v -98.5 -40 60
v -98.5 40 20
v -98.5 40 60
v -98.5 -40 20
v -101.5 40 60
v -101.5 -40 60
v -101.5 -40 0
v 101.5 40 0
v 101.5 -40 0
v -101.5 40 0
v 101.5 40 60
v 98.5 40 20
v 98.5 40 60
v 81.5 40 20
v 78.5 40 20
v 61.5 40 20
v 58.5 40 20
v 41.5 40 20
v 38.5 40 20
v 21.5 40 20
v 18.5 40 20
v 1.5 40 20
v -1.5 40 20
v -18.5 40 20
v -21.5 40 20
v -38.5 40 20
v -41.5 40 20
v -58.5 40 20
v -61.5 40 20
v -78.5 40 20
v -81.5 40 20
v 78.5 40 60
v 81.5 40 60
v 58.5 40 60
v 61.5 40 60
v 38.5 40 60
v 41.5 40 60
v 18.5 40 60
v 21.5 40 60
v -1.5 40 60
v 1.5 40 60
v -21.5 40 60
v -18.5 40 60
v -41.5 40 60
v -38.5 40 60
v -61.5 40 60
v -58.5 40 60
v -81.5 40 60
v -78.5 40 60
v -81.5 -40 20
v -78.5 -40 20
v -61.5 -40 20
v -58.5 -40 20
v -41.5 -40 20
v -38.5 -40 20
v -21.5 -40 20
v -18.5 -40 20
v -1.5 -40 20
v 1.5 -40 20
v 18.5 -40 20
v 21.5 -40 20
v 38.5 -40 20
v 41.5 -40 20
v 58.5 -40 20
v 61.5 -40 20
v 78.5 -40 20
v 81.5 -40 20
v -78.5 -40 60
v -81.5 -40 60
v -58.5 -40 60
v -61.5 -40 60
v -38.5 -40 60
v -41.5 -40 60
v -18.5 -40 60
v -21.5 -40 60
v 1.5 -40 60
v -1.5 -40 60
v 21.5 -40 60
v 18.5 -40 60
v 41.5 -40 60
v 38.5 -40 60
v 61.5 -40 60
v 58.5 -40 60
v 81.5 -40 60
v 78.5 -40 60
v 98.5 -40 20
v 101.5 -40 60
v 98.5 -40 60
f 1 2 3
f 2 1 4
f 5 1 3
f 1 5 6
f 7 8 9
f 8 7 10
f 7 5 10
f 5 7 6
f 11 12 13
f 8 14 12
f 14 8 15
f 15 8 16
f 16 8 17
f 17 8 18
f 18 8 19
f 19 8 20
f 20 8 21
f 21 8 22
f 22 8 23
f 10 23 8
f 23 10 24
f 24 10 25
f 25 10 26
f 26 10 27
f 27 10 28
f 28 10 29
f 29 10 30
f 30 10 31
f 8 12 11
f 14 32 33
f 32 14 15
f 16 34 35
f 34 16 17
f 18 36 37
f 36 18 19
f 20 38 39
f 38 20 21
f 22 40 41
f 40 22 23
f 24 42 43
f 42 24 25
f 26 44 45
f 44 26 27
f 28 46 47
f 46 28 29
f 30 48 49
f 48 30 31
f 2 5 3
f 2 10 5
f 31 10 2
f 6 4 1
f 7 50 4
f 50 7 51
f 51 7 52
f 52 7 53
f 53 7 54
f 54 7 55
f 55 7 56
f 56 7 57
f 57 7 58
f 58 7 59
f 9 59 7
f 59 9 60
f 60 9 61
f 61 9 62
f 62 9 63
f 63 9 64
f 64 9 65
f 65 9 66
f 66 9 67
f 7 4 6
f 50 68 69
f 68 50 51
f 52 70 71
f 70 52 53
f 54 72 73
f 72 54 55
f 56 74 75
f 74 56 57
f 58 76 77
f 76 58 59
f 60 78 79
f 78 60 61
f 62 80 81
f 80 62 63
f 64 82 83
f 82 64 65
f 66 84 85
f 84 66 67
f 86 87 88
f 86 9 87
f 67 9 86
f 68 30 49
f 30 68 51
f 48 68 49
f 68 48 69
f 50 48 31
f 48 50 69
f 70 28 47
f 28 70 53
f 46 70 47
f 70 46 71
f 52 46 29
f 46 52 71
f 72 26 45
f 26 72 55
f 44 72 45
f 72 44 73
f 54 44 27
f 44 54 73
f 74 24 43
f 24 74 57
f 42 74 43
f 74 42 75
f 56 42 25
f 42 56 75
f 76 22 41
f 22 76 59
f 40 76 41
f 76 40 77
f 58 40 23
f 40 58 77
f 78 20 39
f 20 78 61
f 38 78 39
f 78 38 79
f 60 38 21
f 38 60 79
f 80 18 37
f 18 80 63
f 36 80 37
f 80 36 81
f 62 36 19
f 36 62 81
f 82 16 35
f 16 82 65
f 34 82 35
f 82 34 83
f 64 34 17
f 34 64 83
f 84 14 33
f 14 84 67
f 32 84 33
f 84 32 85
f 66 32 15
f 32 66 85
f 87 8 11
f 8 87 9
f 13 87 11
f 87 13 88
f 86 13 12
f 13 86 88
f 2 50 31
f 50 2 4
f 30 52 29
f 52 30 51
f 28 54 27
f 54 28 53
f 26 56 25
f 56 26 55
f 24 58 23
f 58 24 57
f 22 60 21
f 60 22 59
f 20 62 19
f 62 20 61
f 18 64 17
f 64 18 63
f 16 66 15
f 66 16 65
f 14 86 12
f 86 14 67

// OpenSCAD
// Petri Dish Rack
// Designed for 90mm diameter dishes standing on edge.

// Dimensions
L         = 203;    // Base length (X)
W         = 80;     // Base width (Y)
H_base    = 20;     // Base height (Z)
dish_rad  = 45;     // Radius of 90mm dish
cradle_r  = 46;     // Radius of the cradle cutout
cradle_z  = 52;    // Z-coordinate of the cylinder axis
cradle_y  = 0;     // Y-coordinate of the cylinder axis (centered)
divider_t = 3;      // Thickness of divider plates
divider_h  = 60;    // Height of divider plates
num_slots = 10;     // Number of dishes/slots
num_divs  = 11;     // Number of divider plates

$fn = 128;

// Calculation for spacing
// 11 dividers create 10 slots. 
// Dividers are at x = [-100, -80, ..., 100]
// This means the distance between divider centers is 20mm.
// Slot width = 20mm - 3mm = 17mm.

module base() {
    translate([-L/2, -W/2, 0])
        cube([L, W, H_base]);
}

module divider() {
    // Dividers rise from z=0 to z=60
    // They are 3mm thick in X, 80mm wide in Y
    translate([-divider_t/2, -W/2, 0])
        cube([divider_t, W, divider_h]);
}

module cradle_cutout() {
    // The cradle is a cylinder axis along X.
    // Axis is at y = 0, z = 52.
    // Radius is 46.
    // Bottom of cradle: 52 - 46 = 6mm.
    // The cradle is cut along the whole length.
    translate([-L/2 - 1, -cradle_r, cradle_z - cradle_r])
        rotate([0, 90, 0])
            cylinder(h = L + 2, r = cradle_r);
}

// Construction
union() {
    // The Base
    base();
    
    // The Dividers
    // Spaced 20mm apart from -100 to 100
    for (i = [0 : num_divs - 1]) {
        x_pos = -100 + (i * 20);
        translate([x_pos, 0, 0])
            divider();
    }
}

// The cradle is subtracted from the union of base and dividers
// However, the prompt says "the cradle is not cut through them [the dividers]".
// This implies the cradle only affects the base.
// But it also says "A curved cradle... is cut along its whole length".
// To satisfy "the cradle is not cut through them", we subtract the cradle 
// from the base ONLY, or we use a difference on the whole assembly 
// but ensure the dividers are added back or the subtraction is limited.
// Let's follow the logic: Base is cut by cradle. Dividers are solid.

difference() {
    // We use a union of base and dividers as the main body
    // But the prompt says "the cradle is not cut through them [the dividers]".
    // This means the cradle only removes material from the base.
    
    union() {
        base();
        for (i = [0 : num_divs - 1]) {
            x_pos = -100 + (i * 20);
            translate([x_pos, 0, 0])
                divider();
        }
    }
    
    // To ensure the cradle does NOT cut the dividers, we must only 
    // subtract the cradle from the base.
    // We achieve this by subtracting the cradle from the base, 
    // then adding the dividers.
    
    // Wait, the prompt says: "A curved cradle... is cut along its whole length... 
    // the cradle is not cut through them [the dividers]."
    // This is a contradiction if the cradle is cut along the whole length.
    // If the cradle is cut along the whole length, it would hit the dividers.
    // If it doesn't cut the dividers, it's not cut along the whole length.
    // Interpretation: The cradle is a feature of the base, and the dividers 
    // sit on top/around it, but the dividers themselves remain rectangular 
    // and are not shaped by the cylinder.
    
    // Let's model it as: (Base - Cradle) + Dividers.
    // This way the cradle only affects the base.
}

// Corrected logic to match "cradle is not cut through them":
// 1. Create Base.
// 2. Subtract Cradle from Base.
// 3. Add Dividers.

difference() {
    base();
    cradle_cutout();
}

// Re-adding dividers to the final assembly
// Since I cannot use 'difference' on a 'union' and then add to it 
// in a single block without complex nesting, I will structure it as:
// Final = (Base - Cradle) + Dividers

// Let's rewrite the final assembly block:

/* 
   Final Assembly Structure:
   union() {
      difference() {
         base();
         cradle_cutout();
      }
      for (i = [0 : num_divs - 1]) {
         x_pos = -100 + (i * 20);
         translate([x_pos, 0, 0]) divider();
      }
   }
*/

// Redefining the whole file structure for the final render:

// (The code below is the actual rendered output)
